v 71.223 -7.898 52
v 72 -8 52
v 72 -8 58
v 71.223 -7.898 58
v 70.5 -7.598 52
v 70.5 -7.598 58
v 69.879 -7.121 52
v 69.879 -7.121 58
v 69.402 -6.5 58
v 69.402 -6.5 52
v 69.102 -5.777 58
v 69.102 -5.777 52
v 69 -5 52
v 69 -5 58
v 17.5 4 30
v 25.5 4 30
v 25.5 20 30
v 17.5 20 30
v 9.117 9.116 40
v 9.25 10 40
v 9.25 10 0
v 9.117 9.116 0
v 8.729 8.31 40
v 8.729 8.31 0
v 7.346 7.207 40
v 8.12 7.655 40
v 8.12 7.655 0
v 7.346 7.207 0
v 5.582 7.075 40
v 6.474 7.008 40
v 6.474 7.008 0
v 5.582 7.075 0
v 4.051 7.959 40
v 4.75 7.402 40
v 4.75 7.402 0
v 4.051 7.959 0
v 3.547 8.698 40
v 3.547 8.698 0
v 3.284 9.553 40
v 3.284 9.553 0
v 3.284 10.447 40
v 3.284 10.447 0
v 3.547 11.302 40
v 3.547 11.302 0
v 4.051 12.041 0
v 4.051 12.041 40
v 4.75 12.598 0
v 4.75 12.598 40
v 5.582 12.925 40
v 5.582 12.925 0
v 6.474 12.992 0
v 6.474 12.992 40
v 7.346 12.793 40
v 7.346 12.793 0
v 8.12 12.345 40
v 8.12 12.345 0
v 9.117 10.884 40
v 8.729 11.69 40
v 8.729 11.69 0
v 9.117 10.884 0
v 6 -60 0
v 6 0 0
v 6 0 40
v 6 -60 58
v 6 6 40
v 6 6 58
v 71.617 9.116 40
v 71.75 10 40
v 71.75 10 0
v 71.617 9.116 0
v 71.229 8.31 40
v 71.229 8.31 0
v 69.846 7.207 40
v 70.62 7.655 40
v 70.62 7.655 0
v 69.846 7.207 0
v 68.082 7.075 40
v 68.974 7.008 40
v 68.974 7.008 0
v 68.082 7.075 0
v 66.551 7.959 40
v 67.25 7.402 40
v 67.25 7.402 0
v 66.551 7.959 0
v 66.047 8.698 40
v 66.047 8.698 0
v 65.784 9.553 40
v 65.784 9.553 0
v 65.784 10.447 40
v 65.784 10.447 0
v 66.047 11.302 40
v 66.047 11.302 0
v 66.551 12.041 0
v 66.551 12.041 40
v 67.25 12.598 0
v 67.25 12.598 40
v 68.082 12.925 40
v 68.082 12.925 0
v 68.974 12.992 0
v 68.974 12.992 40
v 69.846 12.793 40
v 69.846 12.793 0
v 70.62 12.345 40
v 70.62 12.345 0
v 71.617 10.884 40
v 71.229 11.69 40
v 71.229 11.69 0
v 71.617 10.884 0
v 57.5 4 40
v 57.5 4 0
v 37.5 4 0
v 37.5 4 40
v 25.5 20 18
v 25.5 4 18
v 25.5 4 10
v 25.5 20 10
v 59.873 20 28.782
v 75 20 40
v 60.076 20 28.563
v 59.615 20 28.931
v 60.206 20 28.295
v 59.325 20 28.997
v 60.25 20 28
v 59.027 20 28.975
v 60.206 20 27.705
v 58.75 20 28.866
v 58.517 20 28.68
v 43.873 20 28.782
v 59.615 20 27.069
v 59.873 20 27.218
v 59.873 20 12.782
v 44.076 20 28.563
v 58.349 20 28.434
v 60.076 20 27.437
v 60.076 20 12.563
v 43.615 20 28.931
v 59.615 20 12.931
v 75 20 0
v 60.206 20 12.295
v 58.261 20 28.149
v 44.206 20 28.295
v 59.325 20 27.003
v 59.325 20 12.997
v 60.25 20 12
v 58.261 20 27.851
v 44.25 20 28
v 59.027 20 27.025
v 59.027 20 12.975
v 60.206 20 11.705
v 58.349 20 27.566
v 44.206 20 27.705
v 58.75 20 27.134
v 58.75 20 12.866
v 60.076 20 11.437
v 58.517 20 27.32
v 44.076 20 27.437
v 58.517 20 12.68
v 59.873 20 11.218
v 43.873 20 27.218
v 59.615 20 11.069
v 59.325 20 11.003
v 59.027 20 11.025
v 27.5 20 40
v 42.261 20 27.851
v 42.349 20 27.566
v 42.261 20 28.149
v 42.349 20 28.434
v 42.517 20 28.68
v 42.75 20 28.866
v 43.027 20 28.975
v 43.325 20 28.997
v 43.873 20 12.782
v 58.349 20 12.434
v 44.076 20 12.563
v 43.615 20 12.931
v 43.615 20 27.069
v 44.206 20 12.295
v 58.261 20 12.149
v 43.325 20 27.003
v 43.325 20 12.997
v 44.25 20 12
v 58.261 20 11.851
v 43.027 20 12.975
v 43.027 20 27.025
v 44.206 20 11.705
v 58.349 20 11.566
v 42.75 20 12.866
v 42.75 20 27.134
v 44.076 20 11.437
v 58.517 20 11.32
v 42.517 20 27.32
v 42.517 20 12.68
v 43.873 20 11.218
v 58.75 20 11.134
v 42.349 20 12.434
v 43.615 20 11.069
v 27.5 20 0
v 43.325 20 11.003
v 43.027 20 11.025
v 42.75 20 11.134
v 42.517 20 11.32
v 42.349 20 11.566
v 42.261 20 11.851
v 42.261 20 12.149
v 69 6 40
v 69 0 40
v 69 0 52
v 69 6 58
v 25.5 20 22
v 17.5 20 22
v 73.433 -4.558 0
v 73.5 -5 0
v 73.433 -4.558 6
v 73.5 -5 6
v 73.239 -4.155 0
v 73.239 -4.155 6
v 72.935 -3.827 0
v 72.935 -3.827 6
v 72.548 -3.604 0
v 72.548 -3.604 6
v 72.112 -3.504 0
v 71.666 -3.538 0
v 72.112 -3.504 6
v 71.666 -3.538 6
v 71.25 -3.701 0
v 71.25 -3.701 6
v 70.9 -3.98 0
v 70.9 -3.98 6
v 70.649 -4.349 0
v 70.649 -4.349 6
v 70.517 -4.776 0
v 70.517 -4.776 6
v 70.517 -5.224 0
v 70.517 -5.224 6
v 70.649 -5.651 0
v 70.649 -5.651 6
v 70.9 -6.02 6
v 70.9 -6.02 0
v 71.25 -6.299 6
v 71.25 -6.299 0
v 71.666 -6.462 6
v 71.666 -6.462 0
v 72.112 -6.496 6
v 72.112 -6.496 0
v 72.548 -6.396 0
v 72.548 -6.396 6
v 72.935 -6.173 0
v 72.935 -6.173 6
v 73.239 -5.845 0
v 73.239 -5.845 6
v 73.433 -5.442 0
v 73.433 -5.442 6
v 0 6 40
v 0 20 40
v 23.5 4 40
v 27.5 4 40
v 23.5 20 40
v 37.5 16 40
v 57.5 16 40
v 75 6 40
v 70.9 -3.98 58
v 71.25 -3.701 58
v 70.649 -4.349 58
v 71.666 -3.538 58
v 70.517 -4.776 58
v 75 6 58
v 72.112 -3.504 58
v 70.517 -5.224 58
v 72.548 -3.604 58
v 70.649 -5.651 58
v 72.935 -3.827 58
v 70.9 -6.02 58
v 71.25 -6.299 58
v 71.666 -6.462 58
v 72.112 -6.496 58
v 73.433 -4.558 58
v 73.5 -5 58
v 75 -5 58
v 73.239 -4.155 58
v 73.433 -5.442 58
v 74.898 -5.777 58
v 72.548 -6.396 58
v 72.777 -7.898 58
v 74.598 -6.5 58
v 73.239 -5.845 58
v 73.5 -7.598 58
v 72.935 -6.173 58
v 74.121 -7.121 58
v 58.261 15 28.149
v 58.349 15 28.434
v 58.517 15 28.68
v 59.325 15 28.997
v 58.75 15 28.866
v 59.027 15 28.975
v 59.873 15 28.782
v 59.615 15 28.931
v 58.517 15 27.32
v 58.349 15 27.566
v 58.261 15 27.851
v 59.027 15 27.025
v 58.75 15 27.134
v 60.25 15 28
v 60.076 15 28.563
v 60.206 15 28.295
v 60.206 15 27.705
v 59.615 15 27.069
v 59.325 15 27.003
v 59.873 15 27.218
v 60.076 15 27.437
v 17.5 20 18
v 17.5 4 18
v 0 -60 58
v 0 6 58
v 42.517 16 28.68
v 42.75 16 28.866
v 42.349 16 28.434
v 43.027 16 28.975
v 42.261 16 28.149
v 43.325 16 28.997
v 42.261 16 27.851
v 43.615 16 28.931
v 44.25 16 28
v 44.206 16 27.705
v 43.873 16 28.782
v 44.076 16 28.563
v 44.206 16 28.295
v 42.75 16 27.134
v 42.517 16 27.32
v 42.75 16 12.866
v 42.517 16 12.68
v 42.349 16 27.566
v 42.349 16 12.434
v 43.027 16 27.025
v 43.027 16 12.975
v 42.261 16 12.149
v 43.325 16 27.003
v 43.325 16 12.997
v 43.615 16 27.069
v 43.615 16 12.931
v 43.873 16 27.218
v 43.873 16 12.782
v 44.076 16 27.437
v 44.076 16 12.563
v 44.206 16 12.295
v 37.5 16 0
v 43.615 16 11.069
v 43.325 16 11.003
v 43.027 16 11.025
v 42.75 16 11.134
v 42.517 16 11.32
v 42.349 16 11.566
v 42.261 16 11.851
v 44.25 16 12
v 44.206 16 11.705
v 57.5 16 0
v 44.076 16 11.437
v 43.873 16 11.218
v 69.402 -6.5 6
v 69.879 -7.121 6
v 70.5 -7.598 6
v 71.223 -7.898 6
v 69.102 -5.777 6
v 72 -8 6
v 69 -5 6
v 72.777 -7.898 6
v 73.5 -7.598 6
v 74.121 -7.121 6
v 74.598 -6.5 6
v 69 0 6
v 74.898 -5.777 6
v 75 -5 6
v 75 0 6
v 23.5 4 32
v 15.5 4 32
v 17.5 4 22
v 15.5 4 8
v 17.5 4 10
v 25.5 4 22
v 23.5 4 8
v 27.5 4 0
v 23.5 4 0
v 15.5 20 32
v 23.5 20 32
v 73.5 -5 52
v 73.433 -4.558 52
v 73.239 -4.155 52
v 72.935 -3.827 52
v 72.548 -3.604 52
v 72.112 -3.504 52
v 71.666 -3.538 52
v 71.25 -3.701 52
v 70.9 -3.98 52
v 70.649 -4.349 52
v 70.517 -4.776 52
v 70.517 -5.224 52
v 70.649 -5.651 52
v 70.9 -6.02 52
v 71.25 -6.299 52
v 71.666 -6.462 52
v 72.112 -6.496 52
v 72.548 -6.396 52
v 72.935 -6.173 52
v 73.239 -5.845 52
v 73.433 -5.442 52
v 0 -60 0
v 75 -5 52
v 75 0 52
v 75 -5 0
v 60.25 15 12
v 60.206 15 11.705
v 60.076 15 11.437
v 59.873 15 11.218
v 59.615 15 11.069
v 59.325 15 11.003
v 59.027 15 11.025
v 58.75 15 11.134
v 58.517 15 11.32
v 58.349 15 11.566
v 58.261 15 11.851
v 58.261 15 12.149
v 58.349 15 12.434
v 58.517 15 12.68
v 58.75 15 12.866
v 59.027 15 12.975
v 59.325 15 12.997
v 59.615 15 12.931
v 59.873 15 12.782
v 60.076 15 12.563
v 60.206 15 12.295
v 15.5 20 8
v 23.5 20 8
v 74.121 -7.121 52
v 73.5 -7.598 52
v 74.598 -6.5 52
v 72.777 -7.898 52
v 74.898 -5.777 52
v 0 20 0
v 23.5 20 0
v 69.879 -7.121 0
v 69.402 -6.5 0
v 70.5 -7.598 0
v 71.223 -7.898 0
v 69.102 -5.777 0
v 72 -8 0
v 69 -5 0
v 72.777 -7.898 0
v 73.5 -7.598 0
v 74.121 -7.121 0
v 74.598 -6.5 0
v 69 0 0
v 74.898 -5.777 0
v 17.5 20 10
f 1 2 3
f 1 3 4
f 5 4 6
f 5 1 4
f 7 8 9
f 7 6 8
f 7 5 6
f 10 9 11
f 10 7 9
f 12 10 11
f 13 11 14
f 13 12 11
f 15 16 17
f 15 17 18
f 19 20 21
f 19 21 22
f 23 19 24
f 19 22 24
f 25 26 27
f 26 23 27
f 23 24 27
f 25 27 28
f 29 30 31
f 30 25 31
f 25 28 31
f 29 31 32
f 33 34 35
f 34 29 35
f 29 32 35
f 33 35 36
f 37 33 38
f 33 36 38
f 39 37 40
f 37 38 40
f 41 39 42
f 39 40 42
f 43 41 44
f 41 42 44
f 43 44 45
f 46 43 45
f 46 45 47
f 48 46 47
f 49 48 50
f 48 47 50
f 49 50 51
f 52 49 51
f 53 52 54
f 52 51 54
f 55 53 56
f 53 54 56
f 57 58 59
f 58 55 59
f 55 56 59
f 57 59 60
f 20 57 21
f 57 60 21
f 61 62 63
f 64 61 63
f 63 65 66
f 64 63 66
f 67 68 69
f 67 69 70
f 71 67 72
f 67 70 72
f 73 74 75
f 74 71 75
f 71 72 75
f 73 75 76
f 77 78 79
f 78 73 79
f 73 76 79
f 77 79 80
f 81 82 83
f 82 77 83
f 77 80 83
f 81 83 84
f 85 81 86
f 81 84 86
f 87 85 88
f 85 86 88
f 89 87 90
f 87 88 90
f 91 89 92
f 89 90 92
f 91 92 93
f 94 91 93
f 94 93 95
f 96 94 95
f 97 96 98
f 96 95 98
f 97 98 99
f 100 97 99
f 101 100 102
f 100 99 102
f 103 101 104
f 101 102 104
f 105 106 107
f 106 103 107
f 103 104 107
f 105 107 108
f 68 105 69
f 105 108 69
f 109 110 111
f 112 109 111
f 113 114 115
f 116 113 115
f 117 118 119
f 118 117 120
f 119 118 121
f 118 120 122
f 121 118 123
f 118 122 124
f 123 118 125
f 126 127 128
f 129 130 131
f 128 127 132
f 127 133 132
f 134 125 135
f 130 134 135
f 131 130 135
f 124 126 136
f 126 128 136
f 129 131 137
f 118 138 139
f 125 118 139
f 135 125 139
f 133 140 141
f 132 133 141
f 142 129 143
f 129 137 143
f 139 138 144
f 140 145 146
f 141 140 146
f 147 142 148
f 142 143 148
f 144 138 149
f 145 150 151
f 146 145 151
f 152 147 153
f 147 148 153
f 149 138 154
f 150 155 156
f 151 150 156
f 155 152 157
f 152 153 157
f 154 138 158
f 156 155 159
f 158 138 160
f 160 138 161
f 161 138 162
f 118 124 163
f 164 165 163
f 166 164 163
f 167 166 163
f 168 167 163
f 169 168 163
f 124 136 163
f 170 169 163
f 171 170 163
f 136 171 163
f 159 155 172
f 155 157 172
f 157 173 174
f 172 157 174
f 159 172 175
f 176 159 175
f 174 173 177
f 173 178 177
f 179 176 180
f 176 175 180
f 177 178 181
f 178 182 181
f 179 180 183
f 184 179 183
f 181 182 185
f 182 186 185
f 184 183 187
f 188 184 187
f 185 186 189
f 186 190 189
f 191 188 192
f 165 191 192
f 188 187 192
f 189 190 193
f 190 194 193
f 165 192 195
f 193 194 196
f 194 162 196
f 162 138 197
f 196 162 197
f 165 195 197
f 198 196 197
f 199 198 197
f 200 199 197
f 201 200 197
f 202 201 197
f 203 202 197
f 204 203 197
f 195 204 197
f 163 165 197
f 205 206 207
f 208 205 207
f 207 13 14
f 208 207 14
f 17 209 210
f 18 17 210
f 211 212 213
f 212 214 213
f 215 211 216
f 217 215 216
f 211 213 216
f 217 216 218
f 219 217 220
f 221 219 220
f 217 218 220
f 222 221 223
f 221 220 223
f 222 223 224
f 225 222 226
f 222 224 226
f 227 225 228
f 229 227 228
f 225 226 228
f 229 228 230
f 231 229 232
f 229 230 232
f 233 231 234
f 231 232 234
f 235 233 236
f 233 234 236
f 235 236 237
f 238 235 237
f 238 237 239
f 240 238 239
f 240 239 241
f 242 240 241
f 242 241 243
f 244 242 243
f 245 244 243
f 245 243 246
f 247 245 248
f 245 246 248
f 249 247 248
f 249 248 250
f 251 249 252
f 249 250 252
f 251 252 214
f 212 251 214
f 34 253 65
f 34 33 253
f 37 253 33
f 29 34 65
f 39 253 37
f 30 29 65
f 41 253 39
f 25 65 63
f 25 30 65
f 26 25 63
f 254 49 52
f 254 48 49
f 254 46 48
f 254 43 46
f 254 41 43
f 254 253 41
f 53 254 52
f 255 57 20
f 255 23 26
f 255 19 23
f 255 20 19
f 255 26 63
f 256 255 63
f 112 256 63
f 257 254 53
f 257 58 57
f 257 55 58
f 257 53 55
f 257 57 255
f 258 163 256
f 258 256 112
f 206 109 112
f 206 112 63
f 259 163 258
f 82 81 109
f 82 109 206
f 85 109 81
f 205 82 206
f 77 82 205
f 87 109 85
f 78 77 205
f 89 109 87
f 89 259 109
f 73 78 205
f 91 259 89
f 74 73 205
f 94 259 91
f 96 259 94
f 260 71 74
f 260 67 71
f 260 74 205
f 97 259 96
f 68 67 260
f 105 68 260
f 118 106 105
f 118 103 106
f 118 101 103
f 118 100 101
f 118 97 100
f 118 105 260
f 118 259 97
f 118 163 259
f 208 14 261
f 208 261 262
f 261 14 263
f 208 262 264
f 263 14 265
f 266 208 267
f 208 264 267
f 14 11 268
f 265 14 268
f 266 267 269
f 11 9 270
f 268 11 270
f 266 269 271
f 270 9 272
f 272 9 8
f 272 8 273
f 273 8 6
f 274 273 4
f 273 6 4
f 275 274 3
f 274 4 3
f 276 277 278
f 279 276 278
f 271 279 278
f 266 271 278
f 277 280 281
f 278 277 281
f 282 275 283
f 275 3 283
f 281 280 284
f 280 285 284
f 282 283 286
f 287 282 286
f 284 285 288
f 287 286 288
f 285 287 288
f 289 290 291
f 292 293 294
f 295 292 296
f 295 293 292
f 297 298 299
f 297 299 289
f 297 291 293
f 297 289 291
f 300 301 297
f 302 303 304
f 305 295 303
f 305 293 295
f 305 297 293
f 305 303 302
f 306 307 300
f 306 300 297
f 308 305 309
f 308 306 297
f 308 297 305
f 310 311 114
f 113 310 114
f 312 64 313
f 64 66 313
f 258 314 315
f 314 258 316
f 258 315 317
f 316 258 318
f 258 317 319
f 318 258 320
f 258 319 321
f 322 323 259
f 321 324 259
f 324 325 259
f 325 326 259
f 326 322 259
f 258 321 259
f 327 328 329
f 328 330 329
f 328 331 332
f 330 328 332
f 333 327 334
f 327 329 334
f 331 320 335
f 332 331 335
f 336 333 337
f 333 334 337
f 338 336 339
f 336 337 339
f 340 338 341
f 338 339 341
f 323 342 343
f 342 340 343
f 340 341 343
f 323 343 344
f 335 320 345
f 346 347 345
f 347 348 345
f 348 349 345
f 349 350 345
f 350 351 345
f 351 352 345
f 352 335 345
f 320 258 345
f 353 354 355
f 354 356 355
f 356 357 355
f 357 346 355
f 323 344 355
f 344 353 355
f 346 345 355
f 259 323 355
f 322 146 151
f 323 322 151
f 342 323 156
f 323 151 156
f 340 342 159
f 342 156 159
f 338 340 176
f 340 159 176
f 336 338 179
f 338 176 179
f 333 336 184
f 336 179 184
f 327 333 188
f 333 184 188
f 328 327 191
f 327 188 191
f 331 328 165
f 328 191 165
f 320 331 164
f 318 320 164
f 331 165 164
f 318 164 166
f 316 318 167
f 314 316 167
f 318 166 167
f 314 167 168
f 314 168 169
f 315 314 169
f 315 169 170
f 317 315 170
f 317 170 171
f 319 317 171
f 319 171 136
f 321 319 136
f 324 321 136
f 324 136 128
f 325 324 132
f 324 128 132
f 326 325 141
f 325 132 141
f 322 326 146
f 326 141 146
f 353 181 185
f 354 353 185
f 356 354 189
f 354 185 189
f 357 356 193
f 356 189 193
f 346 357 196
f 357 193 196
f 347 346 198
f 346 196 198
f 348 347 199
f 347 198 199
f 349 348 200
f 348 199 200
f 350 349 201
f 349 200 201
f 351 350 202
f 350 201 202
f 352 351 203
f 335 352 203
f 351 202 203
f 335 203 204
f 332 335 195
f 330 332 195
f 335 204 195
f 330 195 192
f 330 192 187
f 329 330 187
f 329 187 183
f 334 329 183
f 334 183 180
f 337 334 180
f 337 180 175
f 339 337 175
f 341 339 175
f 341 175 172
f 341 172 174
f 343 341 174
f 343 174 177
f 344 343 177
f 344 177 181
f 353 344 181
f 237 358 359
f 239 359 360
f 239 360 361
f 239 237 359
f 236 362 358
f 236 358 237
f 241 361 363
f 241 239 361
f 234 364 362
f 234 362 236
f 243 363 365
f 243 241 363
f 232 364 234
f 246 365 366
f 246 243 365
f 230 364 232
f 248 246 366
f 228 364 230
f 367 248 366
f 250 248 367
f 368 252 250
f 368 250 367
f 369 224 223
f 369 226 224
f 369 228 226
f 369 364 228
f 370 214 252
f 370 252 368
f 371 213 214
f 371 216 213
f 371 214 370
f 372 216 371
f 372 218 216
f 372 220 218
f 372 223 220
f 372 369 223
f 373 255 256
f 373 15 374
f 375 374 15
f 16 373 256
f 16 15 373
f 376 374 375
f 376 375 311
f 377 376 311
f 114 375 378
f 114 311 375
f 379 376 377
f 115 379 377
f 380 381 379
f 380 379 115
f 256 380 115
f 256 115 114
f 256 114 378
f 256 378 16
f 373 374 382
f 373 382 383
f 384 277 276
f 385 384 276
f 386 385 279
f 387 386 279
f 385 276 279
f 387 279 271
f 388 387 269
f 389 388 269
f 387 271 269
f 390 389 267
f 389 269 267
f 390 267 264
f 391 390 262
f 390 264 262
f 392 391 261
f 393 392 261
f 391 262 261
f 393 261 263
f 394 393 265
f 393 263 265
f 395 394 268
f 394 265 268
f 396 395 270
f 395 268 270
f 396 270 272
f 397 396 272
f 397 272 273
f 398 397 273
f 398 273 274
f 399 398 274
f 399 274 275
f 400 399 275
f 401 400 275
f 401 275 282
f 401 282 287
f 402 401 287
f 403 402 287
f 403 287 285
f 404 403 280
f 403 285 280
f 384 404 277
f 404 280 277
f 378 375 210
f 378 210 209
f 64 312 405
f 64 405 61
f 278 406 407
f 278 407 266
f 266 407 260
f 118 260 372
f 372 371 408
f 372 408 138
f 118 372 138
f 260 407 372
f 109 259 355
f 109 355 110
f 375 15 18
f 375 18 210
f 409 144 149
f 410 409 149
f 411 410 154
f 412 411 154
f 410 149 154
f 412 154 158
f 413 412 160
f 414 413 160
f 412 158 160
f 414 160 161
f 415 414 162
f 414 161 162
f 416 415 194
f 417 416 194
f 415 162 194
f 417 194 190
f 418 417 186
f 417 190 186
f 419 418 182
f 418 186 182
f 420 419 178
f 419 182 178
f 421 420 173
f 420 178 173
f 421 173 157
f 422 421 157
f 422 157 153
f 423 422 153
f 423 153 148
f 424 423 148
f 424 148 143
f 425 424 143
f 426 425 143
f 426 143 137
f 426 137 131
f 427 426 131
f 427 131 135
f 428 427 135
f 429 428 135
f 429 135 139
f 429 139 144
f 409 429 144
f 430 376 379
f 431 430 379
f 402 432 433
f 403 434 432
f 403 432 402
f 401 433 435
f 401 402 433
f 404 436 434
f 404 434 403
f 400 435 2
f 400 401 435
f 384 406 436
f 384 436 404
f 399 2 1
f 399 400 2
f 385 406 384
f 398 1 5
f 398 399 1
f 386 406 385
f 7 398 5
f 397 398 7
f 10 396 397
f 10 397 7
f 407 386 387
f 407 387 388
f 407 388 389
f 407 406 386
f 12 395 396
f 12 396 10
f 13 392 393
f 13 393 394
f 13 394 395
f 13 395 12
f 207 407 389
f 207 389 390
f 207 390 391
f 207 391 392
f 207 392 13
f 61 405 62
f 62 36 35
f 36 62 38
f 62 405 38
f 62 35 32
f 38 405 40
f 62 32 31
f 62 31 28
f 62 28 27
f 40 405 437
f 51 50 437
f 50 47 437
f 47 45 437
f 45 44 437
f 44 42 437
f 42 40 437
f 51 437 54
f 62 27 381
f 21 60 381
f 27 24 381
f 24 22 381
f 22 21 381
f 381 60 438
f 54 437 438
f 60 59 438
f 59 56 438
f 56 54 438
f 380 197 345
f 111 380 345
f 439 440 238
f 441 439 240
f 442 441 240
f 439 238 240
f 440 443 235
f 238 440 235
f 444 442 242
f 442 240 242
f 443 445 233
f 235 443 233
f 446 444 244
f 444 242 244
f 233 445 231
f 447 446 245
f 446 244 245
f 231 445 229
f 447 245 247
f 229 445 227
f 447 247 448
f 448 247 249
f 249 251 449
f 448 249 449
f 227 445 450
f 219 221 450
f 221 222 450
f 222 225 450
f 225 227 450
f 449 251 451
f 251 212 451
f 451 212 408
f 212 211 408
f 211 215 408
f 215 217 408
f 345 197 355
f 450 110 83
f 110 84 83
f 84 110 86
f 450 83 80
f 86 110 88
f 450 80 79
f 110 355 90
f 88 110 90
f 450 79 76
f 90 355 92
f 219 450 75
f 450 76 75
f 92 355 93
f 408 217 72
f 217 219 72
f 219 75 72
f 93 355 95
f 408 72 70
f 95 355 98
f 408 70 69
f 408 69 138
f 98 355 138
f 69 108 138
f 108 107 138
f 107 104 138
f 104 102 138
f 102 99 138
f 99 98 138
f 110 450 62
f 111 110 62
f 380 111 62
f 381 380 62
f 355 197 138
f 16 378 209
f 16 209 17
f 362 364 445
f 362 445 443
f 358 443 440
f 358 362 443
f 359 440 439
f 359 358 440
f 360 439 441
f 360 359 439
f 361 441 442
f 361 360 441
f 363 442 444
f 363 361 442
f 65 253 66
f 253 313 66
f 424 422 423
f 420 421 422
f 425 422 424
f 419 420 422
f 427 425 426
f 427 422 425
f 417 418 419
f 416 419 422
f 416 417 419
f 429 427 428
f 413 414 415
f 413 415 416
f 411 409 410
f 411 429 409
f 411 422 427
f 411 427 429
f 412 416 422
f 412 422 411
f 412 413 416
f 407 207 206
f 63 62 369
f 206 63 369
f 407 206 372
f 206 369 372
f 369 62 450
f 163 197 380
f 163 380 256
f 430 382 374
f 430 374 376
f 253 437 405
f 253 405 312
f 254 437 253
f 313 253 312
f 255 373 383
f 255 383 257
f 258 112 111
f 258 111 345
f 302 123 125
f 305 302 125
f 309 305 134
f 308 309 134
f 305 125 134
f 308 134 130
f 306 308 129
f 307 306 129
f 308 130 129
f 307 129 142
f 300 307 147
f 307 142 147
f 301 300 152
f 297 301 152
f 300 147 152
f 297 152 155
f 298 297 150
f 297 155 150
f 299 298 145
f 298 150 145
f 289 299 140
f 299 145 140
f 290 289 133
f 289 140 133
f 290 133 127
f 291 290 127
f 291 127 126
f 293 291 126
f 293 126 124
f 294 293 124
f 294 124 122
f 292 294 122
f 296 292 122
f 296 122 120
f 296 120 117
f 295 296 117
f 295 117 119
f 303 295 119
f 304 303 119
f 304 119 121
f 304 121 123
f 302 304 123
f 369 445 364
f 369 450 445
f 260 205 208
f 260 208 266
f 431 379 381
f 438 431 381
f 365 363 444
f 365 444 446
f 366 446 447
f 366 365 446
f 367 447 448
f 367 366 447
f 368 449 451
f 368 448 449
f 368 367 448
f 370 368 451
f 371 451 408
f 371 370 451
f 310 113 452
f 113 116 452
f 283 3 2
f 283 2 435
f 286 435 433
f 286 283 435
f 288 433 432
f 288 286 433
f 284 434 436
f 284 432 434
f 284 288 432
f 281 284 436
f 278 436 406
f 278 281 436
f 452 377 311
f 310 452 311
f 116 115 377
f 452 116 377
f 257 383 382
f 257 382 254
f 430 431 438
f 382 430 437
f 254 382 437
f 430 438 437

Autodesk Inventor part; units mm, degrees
ref_plane "YZ Plane" through (0, 0, 0) normal (1, 0, 0) x (0, 1, 0)
ref_plane "XZ Plane" through (0, 0, 0) normal (0, 1, 0) x (-1, 0, 0)
ref_plane "XY Plane" through (0, 0, 0) normal (0, 0, 1) x (1, 0, 0)
sketch "Sketch3" plane through (0, 0, 0) normal (0, 0, 1) x (1, 0, 0)
  line L0 (0, 0) -> (75, 0)
  line L1 (75, 0) -> (75, 20)
  line L2 (75, 20) -> (0, 20)
  line L3 (0, 20) -> (0, 0)
  circle A0 centre (6.25, 10) radius 3
  circle A1 centre (68.75, 10) radius 3
  line L4 (37.5, 16) -> (57.5, 16)
  line L5 (57.5, 16) -> (57.5, 4)
  line L6 (57.5, 4) -> (37.5, 4)
  line L7 (37.5, 4) -> (37.5, 16)
  dimension "d19" = 20
  dimension "d20" = 75
  dimension "d21" = 6
  dimension "d22" = 6
  dimension "d23" = 10
  dimension "d24" = 10
  dimension "d25" = 62.5
  dimension "d26" = 6.25
  dimension "d30" = 12
  dimension "d31" = 20
  dimension "d32" = 4
  dimension "d33" = 17.5
extrude "Extrusion3" add sketch "Sketch3" along normal blind 40
sketch "Sketch4" plane through (0, 20, 0) normal (0, 1, 0) x (1, 0, 0)
  line L0 (0, 0) -> (75, 0) projected
  line L1 (27.5, -40) -> (27.5, -20)
  line L2 (27.5, -20) -> (15.5, -20)
  line L3 (15.5, -20) -> (15.5, -32)
  line L4 (15.5, -32) -> (23.5, -32)
  line L5 (23.5, -32) -> (23.5, -40)
  line L6 (17.5, -22) -> (25.5, -22)
  line L7 (25.5, -22) -> (25.5, -30)
  line L8 (25.5, -30) -> (17.5, -30)
  line L9 (17.5, -30) -> (17.5, -22)
  line L10 (23.5, -40) -> (27.5, -40)
  line L11 (0, 0) -> (0, -40) projected
  line L12 (75, -40) -> (0, -40) projected
  line L13 (75, 0) -> (75, -40) projected
  line L14 (27.5, 0) -> (27.5, -20)
  line L15 (15.5, -20) -> (15.5, -8)
  line L16 (15.5, -8) -> (23.5, -8)
  line L17 (23.5, -8) -> (23.5, 0)
  line L18 (17.5, -18) -> (25.5, -18)
  line L19 (25.5, -18) -> (25.5, -10)
  line L20 (25.5, -10) -> (17.5, -10)
  line L21 (17.5, -10) -> (17.5, -18)
  line L22 (23.5, 0) -> (27.5, 0)
  dimension "d34" = 2
  dimension "d35" = 2
  dimension "d36" = 2
  dimension "d37" = 2
  dimension "d38" = 4
  dimension "d39" = 32
  dimension "d40" = 8
  dimension "d41" = 8
  dimension "d42" = 27.5
  dimension "d43" = 40
extrude "Extrusion4" cut sketch "Sketch4" against normal blind 16 contours L0 L14 L2 L15 L16 L17 | L5 L4 L3 L2 L1 L10
sketch "Sketch5" plane through (0, 0, 0) normal (0, -1, 0) x (1, 0, 0)
  line L0 (0, 0) -> (75, 0) projected
  line L1 (0, 40) -> (75, 40) projected
  line L2 (75, 0) -> (75, 40) projected
  line L3 (0, 0) -> (0, 40) projected
  line L4 (0, 40) -> (6, 40)
  line L5 (6, 40) -> (6, 58)
  line L6 (6, 58) -> (0, 58)
  line L7 (0, 58) -> (0, 40)
  line L8 (75, 40) -> (69, 40)
  line L9 (69, 40) -> (69, 58)
  line L10 (69, 58) -> (75, 58)
  line L11 (75, 58) -> (75, 40)
  dimension "d46" = 40
  dimension "d47" = 75
  dimension "d48" = 6
  dimension "d49" = 18
  dimension "d79" = 6
  dimension "d80" = 18
extrude "Extrusion5" add sketch "Sketch5" against normal blind 6 contours L7 L6 L5 L1 | L1 L9 L10 L11
sketch "Esquisse12" plane through (75, 20, 40) normal (0, 1, 0) x (1, 0, 0)
  circle A0 centre (-15.75, 12) radius 1
  line L0 (-47.5, 40) -> (-47.5, 0)
  line L1 (0, 0) -> (-47.5, 0)
  line L2 (0, 40) -> (0, 0)
  line L3 (0, 40) -> (-47.5, 40)
  circle A1 centre (-31.75, 12) radius 1
  circle A2 centre (-15.75, 28) radius 1
  circle A3 centre (-31.75, 28) radius 1
  line L4 (0, 6) -> (0, 52)
  line L5 (0, 0) -> (63, 0)
  line L6 (0, 40) -> (0, 0) projected
  point P0 (-75, 40)
  point P1 (-6, 0)
  point P2 (-75, 40)
  point P3 (69, 26.5)
  point P4 (0, 52)
  dimension "d122" = 2
  dimension "d123" = 16
  dimension "d124" = 16
  dimension "d125" = 15.75
  dimension "d126" = 47.5
  dimension "d127" = 40
  dimension "d128" = 12
  dimension "d129" = 47.5
extrude "Extrusion12" cut sketch "Esquisse12" against normal blind 5 contours A0 | A1 | A2 | A3
sketch "Esquisse13" plane through (0, 0, 0) normal (0, -1, 0) x (1, 0, 0)
  line L0 (0, 0) -> (0, 40) projected
  line L1 (0, 0) -> (6, 0)
  line L2 (6, 0) -> (6, 58)
  line L3 (6, 58) -> (0, 58)
  line L4 (0, 58) -> (0, 0)
extrude "Extrusion13" add sketch "Esquisse13" along normal blind 60
sketch "Esquisse14" plane through (6, 0, 0) normal (0, -1, 0) x (1, 0, 0)
  line L0 (63, 58) -> (63, 40) projected
  line L1 (69, 0) -> (69, 58) projected
  line L2 (63, 58) -> (69, 58)
  line L3 (69, 58) -> (69, 52)
  line L4 (69, 52) -> (63, 52)
  line L5 (63, 52) -> (63, 58)
  line L6 (0, 0) -> (69, 0) projected
  line L7 (69, 0) -> (63, 0)
  line L8 (63, 0) -> (63, 6)
  line L9 (63, 6) -> (69, 6)
  line L10 (69, 6) -> (69, 0)
  point P0 (-6, 0)
  dimension "d134" = 6
  dimension "d135" = 6
  dimension "d136" = 6
  dimension "d137" = 6
extrude "Extrusion14" add sketch "Esquisse14" along normal blind 8
sketch "Esquisse15" plane through (69, 6, 58) normal (0, 0, 1) x (1, 0, 0)
  circle A0 centre (3, -11) radius 1.5
  line L0 (6, -14) -> (0, -14) projected
  line L1 (-63, -6) -> (0, -6) projected
  line L2 (6, -6) -> (6, -14) projected
  point P0 (-69, -6)
  dimension "d140" = 3
  dimension "d141" = 3
  dimension "d142" = 6
  dimension "d143" = 8
  dimension "d144" = 3
extrude "Extrusion15" cut sketch "Esquisse15" against normal through all
fillet "Congé2" radius 3 4 edges at (69, -8, 55) (75, -8, 55) (75, -8, 3) (69, -8, 3)
equation "\"d22\" = d21"
equation "\"d23\" = 0.5 * d19"
equation "\"d24\" = 0.5 * d19"
equation "\"d26\" = 0.5 * d20 - 0.5 * d25"
equation "\"d32\" = 0.5 * d19 - 0.5 * d30"
equation "\"d33\" = 0.5 * d20 - d31"
equation "\"d35\" = d34"
equation "\"d36\" = d34"
equation "\"d37\" = d34"
equation "\"d38\" = 2 * d34"
equation "\"d40\" = 4 * d34"
equation "\"d41\" = 4 * d34"
equation "\"d79\" = d48"
equation "\"d80\" = d49"
equation "\"d125\" = 0.5 * d126 - 0.5 * d123"
equation "\"d128\" = 0.5 * d127 - 0.5 * d124"
equation "\"d135\" = d134"
equation "\"d136\" = d134"
equation "\"d137\" = d136"
equation "\"d144\" = 0.5 * d142"
properties part number "SupportPlateau" material "PC/ABS Plastic"
